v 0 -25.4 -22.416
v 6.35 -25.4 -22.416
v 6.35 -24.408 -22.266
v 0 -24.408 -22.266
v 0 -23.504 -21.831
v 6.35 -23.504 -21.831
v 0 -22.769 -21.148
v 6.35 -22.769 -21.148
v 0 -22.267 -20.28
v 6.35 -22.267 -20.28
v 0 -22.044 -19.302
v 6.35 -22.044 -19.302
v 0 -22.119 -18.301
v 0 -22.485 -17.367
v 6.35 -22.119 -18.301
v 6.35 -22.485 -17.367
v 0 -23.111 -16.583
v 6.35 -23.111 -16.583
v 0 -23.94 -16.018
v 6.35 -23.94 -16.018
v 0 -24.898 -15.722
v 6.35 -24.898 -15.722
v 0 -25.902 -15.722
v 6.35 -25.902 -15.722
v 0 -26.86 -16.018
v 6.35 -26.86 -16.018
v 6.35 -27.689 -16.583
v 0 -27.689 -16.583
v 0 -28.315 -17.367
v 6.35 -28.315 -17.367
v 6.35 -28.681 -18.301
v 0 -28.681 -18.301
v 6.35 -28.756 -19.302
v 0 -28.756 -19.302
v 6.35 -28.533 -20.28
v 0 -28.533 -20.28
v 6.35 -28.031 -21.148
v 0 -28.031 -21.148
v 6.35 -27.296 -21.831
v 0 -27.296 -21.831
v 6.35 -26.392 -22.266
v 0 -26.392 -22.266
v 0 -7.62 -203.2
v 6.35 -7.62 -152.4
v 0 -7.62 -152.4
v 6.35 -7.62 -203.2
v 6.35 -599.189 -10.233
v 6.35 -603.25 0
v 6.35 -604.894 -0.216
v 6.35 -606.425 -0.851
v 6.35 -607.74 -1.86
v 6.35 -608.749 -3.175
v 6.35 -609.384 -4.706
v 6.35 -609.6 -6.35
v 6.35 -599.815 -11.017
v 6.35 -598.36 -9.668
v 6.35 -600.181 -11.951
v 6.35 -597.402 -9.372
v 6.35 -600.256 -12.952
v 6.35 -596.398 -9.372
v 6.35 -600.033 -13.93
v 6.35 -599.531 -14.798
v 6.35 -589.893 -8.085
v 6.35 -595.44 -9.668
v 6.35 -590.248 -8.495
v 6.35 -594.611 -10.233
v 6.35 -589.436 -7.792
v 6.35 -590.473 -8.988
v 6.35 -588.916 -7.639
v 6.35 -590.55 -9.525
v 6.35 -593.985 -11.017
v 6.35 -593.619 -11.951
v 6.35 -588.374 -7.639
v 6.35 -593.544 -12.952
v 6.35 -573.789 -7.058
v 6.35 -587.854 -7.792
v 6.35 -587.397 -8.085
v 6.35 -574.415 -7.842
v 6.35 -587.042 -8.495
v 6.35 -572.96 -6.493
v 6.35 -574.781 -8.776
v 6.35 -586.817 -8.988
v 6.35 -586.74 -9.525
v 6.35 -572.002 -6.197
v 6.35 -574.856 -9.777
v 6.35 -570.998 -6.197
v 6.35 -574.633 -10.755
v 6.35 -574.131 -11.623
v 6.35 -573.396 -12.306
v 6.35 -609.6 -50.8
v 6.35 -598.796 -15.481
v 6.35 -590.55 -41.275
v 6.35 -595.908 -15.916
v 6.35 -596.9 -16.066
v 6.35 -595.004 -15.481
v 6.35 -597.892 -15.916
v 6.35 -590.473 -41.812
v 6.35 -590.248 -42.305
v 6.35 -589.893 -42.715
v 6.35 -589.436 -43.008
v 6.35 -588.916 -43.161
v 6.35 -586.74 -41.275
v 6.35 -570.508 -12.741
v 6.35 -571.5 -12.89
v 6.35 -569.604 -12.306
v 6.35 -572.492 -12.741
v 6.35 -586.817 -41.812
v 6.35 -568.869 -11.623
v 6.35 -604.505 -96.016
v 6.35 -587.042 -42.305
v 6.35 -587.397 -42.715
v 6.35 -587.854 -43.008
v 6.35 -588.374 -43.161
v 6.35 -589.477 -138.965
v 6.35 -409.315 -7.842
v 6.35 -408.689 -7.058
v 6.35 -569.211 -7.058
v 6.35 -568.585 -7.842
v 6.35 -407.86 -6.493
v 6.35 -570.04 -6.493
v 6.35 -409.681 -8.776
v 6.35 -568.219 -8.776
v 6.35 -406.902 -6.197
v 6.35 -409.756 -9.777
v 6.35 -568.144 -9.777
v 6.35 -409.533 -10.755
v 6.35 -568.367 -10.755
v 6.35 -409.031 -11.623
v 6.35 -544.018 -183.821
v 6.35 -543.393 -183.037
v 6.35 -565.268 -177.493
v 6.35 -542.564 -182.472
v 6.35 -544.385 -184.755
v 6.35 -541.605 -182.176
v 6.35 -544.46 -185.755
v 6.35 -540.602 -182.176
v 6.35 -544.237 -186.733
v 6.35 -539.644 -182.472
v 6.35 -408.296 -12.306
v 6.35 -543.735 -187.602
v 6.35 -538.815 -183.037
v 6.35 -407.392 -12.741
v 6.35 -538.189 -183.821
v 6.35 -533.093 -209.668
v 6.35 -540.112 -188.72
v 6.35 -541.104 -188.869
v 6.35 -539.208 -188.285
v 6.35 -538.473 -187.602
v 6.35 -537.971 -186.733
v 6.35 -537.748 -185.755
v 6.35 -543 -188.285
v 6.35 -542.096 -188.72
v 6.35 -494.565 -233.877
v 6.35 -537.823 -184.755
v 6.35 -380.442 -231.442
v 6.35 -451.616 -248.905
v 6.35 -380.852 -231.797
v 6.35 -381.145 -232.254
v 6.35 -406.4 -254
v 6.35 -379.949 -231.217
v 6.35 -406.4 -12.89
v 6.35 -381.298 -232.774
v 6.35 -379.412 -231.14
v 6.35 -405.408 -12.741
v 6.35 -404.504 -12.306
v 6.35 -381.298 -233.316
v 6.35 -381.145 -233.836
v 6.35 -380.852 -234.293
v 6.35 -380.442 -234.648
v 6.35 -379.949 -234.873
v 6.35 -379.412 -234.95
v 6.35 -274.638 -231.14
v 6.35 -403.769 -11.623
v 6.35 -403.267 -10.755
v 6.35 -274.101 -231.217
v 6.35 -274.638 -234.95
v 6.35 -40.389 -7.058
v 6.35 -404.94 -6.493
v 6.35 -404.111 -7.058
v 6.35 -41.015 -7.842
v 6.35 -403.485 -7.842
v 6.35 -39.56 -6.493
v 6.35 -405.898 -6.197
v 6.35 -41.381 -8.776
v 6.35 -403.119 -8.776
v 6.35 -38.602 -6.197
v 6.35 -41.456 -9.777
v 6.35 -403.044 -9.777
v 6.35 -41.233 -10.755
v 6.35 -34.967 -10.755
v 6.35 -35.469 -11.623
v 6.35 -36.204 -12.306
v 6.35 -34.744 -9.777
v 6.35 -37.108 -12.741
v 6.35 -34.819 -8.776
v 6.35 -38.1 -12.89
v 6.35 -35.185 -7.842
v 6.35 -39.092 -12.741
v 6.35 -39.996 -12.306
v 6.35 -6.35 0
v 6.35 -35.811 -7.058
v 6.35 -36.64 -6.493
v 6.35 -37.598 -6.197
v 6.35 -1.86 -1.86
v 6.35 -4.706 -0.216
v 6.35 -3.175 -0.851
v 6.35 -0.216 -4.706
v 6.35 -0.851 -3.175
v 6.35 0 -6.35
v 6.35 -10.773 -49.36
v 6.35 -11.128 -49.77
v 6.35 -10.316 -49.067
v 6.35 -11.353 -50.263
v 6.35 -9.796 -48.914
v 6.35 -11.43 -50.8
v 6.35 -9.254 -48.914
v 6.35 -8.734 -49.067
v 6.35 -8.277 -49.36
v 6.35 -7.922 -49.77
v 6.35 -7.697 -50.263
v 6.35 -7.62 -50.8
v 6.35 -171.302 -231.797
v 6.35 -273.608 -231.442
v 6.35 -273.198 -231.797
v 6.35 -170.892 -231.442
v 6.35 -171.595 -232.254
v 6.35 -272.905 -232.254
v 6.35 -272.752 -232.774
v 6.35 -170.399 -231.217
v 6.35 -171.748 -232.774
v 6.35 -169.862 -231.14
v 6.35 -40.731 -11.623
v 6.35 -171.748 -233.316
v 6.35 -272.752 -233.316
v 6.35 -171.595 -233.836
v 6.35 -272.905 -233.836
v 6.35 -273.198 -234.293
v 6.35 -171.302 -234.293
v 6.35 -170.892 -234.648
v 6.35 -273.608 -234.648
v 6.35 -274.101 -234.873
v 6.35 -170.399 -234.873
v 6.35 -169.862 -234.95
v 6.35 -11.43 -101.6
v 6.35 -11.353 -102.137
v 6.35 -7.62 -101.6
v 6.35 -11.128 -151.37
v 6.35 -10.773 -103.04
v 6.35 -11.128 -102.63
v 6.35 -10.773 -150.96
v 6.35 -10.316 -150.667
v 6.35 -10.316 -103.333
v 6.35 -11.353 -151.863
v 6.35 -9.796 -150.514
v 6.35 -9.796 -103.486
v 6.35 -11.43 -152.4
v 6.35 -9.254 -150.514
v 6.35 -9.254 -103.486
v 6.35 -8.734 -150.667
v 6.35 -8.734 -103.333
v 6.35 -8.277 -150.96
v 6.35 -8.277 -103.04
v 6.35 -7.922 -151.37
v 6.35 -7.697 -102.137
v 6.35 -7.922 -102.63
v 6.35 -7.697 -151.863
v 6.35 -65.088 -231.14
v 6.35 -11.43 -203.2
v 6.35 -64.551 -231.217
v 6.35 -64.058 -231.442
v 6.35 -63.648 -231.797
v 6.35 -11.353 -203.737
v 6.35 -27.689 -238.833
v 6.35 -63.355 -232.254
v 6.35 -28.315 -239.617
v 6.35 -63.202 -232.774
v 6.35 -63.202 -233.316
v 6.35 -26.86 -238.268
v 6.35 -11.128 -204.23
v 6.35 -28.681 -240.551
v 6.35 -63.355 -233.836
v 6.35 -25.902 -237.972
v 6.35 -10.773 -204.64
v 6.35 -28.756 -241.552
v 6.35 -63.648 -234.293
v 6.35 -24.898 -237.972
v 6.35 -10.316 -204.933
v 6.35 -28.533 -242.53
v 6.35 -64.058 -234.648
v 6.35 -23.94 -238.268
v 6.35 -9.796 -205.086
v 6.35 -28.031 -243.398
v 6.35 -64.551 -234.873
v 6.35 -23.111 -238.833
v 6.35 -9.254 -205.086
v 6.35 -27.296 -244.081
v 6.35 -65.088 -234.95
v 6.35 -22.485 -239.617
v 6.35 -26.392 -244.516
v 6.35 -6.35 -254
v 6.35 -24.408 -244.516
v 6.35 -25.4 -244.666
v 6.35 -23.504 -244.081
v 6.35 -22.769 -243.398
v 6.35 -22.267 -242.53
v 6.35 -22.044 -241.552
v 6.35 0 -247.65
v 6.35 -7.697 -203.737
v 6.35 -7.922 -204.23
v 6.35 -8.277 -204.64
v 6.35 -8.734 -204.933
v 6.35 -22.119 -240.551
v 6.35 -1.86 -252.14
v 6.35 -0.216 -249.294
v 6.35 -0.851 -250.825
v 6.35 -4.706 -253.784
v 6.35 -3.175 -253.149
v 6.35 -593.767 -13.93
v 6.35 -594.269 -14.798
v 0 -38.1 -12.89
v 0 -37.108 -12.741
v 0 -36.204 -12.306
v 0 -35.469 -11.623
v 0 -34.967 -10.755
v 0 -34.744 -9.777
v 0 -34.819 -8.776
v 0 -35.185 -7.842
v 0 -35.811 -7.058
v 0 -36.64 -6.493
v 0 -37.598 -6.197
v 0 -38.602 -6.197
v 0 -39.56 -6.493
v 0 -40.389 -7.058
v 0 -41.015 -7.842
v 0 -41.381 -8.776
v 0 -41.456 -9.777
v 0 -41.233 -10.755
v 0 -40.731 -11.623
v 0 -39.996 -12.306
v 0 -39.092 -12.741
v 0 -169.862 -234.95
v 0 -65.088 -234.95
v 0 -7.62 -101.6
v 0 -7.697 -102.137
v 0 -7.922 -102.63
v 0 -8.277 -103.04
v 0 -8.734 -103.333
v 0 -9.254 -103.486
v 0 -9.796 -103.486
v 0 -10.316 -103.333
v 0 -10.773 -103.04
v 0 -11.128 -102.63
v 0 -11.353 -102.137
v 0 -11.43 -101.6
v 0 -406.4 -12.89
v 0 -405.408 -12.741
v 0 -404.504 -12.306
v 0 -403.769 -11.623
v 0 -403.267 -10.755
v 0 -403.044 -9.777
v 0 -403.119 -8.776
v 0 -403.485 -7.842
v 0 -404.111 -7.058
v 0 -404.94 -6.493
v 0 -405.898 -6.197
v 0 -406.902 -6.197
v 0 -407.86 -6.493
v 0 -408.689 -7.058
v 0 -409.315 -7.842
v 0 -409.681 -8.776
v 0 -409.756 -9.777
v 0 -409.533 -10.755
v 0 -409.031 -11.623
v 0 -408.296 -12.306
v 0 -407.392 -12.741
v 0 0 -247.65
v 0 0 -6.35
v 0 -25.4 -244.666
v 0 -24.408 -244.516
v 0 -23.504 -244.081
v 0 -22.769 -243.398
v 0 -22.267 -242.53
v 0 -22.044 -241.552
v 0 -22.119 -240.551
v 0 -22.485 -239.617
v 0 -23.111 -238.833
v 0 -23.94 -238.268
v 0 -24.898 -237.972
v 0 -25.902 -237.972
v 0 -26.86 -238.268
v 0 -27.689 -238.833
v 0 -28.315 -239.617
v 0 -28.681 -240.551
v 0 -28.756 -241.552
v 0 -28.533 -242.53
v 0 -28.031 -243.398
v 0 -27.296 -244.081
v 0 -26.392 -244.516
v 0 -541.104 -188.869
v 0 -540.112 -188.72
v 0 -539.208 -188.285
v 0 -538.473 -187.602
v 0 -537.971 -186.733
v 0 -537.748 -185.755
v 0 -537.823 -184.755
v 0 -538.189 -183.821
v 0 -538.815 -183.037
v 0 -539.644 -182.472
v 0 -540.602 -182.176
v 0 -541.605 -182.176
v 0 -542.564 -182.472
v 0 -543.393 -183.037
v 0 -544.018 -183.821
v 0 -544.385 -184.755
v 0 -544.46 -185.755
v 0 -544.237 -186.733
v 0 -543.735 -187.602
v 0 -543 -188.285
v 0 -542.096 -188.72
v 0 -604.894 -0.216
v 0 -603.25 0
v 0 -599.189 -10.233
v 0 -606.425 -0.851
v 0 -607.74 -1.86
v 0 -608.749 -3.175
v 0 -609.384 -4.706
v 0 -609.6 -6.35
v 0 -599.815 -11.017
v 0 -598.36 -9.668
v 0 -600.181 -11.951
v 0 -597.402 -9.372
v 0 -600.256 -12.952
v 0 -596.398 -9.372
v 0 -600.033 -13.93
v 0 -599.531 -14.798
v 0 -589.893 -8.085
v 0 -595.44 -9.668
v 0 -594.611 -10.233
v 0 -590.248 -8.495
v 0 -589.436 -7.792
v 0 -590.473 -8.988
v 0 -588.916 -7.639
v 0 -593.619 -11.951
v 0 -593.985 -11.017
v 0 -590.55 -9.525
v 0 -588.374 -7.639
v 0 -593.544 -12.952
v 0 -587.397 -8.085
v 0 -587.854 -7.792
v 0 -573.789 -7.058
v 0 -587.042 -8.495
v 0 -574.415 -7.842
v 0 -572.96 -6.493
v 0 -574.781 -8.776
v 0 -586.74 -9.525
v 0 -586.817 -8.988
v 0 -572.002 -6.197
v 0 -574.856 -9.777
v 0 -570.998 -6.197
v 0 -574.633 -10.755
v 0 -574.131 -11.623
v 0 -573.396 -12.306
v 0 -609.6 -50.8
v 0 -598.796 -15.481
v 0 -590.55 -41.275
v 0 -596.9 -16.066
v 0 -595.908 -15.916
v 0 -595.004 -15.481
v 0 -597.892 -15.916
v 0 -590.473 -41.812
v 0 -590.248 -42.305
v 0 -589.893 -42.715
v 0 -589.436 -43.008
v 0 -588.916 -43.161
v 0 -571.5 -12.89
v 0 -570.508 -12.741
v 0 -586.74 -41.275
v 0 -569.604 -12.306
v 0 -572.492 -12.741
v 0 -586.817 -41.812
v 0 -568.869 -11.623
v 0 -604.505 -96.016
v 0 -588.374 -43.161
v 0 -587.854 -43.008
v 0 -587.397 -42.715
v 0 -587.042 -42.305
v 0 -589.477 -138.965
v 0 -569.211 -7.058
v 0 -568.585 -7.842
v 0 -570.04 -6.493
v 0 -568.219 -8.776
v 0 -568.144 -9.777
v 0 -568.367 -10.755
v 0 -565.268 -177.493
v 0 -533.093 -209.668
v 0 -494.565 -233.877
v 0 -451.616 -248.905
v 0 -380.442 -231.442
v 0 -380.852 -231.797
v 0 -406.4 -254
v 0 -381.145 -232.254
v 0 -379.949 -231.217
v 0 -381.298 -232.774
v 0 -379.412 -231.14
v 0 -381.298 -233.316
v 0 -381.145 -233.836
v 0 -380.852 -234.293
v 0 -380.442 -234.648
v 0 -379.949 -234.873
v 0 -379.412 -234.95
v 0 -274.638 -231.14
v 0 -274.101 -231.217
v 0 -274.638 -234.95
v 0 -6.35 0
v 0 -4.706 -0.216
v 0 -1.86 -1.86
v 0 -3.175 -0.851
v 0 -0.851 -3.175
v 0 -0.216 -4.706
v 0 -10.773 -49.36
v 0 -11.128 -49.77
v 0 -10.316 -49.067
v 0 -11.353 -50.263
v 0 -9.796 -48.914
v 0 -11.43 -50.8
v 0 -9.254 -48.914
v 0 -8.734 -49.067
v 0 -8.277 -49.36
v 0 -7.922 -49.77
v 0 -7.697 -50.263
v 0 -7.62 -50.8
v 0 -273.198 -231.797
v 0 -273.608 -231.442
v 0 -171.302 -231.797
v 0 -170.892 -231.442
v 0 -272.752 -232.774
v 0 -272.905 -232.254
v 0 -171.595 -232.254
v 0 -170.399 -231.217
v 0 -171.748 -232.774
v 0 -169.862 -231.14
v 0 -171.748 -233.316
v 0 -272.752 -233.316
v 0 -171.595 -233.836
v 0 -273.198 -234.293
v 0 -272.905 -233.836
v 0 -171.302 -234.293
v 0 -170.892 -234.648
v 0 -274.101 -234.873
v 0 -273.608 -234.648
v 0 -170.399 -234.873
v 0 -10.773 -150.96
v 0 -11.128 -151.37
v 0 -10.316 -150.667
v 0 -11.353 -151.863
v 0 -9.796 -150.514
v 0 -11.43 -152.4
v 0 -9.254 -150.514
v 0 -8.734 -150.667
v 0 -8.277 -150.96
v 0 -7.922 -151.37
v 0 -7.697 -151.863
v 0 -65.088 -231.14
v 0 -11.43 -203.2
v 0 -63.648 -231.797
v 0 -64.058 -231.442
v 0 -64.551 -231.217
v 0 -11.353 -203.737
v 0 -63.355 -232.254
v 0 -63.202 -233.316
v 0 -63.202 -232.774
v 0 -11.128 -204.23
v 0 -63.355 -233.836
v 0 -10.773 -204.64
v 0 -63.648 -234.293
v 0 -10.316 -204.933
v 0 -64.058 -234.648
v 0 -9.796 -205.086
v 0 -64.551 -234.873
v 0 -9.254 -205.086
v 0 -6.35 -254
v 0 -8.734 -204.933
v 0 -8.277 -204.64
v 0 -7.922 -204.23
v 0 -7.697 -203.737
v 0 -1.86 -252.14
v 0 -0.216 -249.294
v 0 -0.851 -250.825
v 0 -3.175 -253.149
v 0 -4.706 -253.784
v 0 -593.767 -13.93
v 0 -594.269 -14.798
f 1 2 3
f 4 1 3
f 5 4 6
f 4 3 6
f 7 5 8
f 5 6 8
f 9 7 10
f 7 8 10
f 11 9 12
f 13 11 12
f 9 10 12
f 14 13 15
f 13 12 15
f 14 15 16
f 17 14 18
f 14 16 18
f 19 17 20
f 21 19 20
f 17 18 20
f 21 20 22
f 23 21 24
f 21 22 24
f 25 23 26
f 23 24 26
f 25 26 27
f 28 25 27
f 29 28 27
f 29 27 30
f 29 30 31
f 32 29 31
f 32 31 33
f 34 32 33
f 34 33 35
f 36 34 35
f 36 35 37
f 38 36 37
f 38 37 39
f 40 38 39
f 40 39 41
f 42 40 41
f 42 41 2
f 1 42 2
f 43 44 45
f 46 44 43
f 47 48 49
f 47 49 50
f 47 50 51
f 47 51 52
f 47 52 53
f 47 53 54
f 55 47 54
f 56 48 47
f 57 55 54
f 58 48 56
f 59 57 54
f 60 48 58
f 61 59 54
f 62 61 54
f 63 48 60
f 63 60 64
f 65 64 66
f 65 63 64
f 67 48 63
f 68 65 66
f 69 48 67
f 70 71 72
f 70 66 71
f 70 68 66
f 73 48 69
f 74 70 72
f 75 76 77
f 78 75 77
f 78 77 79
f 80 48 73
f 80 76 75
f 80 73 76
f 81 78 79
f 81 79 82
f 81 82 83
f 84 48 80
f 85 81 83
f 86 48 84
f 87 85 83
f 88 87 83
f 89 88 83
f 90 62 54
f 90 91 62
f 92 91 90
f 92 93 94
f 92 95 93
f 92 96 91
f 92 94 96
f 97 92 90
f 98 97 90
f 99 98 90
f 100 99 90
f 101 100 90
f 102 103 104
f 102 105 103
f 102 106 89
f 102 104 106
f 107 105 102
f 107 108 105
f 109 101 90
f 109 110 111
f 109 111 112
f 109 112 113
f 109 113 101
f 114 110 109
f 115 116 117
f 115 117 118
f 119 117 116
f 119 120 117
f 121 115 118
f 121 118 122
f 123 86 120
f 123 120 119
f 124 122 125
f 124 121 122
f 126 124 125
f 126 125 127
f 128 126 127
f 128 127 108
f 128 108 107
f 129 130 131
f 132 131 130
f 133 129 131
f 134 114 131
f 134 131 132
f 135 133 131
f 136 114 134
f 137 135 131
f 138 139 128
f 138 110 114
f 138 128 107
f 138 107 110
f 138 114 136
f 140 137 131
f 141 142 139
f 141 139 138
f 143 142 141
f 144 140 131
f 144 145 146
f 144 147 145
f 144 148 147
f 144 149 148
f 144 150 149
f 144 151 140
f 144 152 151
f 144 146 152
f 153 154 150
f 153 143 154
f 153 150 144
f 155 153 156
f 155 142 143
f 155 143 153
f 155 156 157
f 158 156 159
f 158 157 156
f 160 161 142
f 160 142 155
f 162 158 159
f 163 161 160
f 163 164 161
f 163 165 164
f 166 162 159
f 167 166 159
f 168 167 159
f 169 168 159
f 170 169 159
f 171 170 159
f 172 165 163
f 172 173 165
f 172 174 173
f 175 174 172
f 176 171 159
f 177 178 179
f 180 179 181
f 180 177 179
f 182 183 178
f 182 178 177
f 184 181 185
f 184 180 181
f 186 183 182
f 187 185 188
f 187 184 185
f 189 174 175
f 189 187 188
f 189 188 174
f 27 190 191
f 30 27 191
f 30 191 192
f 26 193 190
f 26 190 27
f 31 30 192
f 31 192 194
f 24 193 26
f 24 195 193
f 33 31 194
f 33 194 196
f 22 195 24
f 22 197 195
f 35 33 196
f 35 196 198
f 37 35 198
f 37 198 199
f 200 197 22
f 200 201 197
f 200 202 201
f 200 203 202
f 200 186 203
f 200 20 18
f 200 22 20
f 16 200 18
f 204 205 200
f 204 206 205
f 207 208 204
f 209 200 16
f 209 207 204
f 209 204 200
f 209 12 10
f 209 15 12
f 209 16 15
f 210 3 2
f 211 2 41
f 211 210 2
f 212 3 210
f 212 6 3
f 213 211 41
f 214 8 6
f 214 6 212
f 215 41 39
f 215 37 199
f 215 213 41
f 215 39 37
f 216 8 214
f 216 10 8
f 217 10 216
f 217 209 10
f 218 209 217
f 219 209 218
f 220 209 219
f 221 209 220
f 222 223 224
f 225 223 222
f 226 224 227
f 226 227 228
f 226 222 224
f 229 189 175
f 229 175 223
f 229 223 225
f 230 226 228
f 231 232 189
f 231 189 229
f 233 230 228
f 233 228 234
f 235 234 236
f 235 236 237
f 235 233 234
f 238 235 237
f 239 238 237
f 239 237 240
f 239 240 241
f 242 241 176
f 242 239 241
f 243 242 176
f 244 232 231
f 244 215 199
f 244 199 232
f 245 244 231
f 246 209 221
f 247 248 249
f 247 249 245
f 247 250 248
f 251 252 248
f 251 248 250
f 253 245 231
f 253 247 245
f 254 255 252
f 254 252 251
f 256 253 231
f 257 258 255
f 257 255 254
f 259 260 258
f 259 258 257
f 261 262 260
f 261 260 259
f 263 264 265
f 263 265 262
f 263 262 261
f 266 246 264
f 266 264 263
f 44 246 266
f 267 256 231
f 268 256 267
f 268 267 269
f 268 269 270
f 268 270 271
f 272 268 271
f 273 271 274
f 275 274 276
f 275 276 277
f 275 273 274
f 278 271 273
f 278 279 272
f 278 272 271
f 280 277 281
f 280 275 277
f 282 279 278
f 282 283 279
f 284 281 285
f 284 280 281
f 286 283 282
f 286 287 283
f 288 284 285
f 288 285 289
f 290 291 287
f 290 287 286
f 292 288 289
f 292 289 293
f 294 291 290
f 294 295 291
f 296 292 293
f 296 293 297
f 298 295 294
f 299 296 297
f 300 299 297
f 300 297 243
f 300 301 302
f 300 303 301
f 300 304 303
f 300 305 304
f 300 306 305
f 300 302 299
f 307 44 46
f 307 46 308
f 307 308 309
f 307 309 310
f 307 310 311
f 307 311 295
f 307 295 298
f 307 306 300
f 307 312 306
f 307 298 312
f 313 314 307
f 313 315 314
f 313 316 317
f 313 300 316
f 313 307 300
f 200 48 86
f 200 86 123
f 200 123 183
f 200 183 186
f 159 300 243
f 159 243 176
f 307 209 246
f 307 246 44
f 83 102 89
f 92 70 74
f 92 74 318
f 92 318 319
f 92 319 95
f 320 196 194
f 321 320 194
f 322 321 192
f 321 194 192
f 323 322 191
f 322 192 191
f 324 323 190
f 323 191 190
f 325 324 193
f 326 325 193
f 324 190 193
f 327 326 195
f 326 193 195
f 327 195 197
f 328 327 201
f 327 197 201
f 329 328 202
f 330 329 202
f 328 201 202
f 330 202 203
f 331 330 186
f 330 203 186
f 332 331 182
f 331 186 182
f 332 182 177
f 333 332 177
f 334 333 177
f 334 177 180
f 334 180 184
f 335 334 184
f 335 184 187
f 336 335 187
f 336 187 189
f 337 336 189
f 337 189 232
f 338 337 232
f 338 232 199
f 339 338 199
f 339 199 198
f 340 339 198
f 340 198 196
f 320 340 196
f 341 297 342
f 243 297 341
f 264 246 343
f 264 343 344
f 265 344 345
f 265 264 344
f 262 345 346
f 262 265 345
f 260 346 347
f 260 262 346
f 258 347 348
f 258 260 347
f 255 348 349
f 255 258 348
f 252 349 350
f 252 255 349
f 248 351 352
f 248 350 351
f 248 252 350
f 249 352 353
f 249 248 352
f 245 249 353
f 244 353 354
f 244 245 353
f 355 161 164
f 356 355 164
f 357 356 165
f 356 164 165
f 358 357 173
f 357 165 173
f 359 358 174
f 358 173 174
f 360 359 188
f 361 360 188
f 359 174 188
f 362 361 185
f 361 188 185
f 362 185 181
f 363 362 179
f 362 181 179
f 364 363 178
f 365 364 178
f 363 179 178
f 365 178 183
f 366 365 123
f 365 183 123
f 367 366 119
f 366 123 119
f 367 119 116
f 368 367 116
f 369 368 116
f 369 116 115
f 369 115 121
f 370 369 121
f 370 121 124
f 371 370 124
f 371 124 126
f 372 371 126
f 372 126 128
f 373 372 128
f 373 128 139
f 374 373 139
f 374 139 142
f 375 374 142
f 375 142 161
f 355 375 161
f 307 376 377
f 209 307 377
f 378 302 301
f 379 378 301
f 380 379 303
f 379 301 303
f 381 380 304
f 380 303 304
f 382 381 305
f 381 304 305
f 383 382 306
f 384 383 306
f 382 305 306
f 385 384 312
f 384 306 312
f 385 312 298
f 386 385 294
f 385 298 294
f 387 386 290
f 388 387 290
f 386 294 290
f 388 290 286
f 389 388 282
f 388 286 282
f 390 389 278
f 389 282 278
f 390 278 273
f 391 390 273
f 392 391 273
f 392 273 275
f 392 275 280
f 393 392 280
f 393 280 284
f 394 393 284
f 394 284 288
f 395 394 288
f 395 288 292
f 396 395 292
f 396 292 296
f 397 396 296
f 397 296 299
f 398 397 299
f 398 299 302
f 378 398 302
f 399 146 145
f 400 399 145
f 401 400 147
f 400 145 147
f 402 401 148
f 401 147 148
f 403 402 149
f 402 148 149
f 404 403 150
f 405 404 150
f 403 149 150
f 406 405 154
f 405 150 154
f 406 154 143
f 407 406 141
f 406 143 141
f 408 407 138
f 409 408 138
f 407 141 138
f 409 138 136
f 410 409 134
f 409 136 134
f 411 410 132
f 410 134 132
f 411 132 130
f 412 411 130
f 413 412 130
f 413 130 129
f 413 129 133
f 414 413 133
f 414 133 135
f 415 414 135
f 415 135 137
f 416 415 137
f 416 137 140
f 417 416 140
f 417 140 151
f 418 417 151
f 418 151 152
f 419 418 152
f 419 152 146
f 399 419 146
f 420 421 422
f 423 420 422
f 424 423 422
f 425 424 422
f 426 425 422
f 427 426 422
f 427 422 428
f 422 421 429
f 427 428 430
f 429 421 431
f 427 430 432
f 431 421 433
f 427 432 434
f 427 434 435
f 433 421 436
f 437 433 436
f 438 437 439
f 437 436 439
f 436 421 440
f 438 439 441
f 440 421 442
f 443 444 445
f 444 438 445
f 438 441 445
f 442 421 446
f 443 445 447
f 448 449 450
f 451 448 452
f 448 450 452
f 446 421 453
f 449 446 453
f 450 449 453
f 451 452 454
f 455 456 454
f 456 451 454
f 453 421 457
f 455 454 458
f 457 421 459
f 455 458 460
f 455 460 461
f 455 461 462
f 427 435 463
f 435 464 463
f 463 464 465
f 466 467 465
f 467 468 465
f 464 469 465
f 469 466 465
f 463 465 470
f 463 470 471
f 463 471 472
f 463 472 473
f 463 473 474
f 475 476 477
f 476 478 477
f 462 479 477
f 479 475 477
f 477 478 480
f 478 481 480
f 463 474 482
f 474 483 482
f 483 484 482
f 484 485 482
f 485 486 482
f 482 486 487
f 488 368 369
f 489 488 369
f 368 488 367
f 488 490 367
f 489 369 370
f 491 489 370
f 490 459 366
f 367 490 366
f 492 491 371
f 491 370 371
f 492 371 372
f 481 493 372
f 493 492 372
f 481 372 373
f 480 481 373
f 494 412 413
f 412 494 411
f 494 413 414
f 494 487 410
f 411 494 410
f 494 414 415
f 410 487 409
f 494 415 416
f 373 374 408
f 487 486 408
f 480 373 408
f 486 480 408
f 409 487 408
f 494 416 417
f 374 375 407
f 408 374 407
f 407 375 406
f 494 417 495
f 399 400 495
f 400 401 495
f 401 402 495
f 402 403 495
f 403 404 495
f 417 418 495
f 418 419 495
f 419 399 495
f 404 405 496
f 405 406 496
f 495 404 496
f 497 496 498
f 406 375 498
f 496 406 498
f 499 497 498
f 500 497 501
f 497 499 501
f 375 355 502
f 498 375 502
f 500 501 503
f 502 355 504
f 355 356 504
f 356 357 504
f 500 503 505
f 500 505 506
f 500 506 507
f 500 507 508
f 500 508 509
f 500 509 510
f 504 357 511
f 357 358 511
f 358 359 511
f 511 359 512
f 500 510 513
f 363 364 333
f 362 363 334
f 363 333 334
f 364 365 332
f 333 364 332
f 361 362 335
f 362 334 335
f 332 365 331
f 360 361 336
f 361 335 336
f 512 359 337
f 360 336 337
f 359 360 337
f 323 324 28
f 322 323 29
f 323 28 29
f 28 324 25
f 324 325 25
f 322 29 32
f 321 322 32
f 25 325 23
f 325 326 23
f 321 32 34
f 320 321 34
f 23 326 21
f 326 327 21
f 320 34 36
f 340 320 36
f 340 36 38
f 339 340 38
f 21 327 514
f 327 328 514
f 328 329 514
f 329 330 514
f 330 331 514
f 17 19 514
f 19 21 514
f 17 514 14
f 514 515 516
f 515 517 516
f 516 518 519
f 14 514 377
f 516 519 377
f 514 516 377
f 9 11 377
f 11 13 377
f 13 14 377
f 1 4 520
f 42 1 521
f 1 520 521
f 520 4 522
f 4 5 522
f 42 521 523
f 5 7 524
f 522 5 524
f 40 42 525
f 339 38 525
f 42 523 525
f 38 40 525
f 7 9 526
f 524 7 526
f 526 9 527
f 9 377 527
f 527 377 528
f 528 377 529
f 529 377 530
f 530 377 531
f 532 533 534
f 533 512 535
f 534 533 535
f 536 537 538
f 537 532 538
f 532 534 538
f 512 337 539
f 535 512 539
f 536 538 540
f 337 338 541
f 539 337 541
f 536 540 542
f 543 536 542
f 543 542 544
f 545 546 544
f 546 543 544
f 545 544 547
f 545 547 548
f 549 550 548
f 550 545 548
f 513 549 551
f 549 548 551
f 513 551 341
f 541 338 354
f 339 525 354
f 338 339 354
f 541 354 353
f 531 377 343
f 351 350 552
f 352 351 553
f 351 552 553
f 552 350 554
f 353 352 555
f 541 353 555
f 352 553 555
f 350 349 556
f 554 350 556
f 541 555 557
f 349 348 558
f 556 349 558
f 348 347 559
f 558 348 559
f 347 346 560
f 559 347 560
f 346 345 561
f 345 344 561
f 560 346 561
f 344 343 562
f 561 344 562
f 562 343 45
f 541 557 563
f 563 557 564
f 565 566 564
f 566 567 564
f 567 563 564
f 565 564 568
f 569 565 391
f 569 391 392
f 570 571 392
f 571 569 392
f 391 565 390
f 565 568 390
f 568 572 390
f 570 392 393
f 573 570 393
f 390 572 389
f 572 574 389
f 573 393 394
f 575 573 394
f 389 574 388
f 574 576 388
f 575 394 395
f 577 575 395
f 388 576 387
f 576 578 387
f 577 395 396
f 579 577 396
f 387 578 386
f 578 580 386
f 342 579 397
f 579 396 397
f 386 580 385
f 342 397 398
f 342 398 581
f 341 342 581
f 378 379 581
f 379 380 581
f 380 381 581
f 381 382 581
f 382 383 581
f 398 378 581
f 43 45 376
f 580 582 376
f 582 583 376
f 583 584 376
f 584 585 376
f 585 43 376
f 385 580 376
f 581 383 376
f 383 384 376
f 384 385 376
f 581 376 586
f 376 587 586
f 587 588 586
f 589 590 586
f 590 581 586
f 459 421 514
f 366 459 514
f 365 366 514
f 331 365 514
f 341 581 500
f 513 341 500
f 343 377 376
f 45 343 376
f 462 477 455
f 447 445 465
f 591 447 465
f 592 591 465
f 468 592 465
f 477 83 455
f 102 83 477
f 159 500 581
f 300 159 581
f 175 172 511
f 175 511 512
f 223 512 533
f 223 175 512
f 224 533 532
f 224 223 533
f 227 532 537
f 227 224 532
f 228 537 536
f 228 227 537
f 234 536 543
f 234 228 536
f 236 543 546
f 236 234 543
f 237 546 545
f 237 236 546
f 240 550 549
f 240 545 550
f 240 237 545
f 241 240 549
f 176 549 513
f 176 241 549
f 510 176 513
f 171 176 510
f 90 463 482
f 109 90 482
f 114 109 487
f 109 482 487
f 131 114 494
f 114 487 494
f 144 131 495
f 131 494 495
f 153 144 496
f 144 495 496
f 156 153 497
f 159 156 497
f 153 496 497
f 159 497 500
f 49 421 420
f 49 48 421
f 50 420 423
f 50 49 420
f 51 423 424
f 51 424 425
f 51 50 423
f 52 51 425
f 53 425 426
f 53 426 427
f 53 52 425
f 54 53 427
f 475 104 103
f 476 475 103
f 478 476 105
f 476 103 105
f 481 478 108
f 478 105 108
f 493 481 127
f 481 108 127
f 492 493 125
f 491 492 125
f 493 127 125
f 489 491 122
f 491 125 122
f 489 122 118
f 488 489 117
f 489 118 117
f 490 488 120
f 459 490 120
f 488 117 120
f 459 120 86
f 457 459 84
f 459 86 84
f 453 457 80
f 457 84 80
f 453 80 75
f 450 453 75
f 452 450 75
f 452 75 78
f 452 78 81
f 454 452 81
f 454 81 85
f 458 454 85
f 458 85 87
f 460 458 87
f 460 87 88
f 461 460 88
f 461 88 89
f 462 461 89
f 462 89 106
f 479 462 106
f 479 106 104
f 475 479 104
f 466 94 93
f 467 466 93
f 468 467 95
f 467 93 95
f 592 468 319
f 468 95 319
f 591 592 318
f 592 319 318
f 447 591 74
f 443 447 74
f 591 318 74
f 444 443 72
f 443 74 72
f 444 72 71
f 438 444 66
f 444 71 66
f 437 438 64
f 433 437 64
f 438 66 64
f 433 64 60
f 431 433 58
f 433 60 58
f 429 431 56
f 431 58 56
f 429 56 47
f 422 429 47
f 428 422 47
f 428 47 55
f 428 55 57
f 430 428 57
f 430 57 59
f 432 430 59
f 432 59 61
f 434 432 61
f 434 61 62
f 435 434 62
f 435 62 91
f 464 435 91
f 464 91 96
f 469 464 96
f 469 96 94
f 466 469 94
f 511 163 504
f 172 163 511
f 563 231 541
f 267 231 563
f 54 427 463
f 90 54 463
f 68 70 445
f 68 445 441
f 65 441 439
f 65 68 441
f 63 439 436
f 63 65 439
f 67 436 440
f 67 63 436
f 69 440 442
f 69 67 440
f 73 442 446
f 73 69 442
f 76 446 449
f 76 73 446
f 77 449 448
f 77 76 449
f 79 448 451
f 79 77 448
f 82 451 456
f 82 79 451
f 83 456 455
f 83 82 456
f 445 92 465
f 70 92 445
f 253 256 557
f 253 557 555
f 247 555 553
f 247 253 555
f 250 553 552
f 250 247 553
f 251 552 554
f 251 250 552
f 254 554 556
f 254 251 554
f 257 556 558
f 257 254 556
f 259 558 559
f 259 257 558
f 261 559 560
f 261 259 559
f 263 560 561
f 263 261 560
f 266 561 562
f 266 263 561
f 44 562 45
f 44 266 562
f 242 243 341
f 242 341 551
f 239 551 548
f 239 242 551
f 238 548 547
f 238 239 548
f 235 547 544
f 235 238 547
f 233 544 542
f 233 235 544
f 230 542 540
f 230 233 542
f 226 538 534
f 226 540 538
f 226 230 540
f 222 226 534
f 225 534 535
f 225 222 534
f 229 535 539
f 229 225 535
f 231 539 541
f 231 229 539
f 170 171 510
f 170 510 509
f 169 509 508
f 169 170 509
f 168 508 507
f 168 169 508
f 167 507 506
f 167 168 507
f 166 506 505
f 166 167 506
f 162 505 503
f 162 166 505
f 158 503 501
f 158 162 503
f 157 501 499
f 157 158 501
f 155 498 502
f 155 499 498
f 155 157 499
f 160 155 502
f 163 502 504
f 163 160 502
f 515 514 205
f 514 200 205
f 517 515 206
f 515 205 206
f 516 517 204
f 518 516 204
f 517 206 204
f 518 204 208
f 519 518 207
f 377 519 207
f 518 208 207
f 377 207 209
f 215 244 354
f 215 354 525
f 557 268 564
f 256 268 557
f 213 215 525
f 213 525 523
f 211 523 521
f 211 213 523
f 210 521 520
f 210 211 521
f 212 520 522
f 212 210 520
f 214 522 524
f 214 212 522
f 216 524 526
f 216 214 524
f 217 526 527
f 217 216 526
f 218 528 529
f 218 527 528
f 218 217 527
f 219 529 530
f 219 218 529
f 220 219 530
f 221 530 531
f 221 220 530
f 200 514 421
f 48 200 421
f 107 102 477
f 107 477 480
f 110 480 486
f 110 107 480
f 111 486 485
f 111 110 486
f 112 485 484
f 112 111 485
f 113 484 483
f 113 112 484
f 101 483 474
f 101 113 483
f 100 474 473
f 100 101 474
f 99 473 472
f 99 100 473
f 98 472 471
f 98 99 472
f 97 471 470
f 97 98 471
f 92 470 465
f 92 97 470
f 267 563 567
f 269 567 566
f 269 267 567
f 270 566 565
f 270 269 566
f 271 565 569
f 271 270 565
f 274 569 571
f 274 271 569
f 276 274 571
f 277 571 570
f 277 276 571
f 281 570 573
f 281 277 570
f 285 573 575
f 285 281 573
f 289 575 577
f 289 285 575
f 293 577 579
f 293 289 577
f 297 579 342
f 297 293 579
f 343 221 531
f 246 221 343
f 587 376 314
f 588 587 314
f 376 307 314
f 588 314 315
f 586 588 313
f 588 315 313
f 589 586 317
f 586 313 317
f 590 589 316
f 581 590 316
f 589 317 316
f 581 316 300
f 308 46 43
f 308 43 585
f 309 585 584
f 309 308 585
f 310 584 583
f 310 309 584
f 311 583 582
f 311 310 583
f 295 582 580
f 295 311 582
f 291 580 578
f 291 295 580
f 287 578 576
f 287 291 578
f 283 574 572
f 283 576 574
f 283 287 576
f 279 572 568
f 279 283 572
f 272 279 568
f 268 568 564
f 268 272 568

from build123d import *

# Parameters (mm, degrees)
BOSS_EXTRUDE1_DEPTH     = 6.35
SKETCH2_R               = 3.3655
CUT_EXTRUDE1_DEPTH      = 7.35
FILLET1_R               = 6.35
CUT_EXTRUDE6_DEPTH      = 7.35
SKETCH4_R               = 3.3655
CUT_EXTRUDE3_DEPTH      = 7.35
CUT_EXTRUDE7_DEPTH      = 7.35
CUT_EXTRUDE8_DEPTH      = 1
CUT_EXTRUDE8_DEPTH_BACK = 7.35


with BuildPart() as part:
    # Sketch1 → Boss-Extrude1 (new body)
    with BuildSketch(Plane(origin=(0, 0, 0), x_dir=(0, 0, -1), z_dir=(1, 0, 0))):
        with BuildLine():
            Line((0, 0), (0, -609.6))
            Line((0, -609.6), (50.8, -609.6))
            ThreePointArc((50.8, -609.6), (194.484097937, -550.084097937), (254, -406.4))
            Line((254, -406.4), (254, 0))
            Line((254, 0), (0, 0))
        make_face()
    extrude(amount=BOSS_EXTRUDE1_DEPTH)

    # Sketch2 → Cut-Extrude1 (cut, through all)
    with BuildSketch(Plane(origin=(6.35, 0, 0), x_dir=(0, 0, -1), z_dir=(1, 0, 0))):
        with Locations((241.3, -25.4)):
            Circle(SKETCH2_R)
        with Locations((12.7, -596.9)):
            Circle(SKETCH2_R)
        with Locations((185.503841816, -541.103841816)):
            Circle(SKETCH2_R)
        with Locations((19.05, -25.4)):
            Circle(SKETCH2_R)
    extrude(amount=-CUT_EXTRUDE1_DEPTH, mode=Mode.SUBTRACT)

    # Fillet1
    fillet1_edges = [part.edges().sort_by_distance(p)[0] for p in [
        (3.175, 0, -254),
        (3.175, -609.6, 0),
        (3.175, 0, 0),
    ]]
    fillet(fillet1_edges, radius=FILLET1_R)

    # Sketch3 → Cut-Extrude6 (cut, through all)
    with BuildSketch(Plane(origin=(6.35, 0, 0), x_dir=(0, 0, -1), z_dir=(1, 0, 0))):
        with BuildLine():
            Line((50.8, -7.62), (101.6, -7.62))
            ThreePointArc((101.6, -7.62), (103.505, -9.525), (101.6, -11.43))
            Line((101.6, -11.43), (50.8, -11.43))
            ThreePointArc((50.8, -11.43), (48.895, -9.525), (50.8, -7.62))
        make_face()
        with BuildLine():
            Line((152.4, -7.62), (203.2, -7.62))
            ThreePointArc((203.2, -7.62), (205.105, -9.525), (203.2, -11.43))
            Line((203.2, -11.43), (152.4, -11.43))
            ThreePointArc((152.4, -11.43), (150.495, -9.525), (152.4, -7.62))
        make_face()
    extrude(amount=-CUT_EXTRUDE6_DEPTH, mode=Mode.SUBTRACT)

    # Sketch4 → Cut-Extrude3 (cut, through all)
    with BuildSketch(Plane(origin=(6.35, 0, 0), x_dir=(0, 0, -1), z_dir=(1, 0, 0))):
        with Locations((9.525, -38.1)):
            Circle(SKETCH4_R)
        with Locations((9.525, -406.4)):
            Circle(SKETCH4_R)
        with Locations((9.525, -571.5)):
            Circle(SKETCH4_R)
    extrude(amount=-CUT_EXTRUDE3_DEPTH, mode=Mode.SUBTRACT)

    # Sketch6 → Cut-Extrude7 (cut, through all)
    with BuildSketch(Plane(origin=(6.35, 0, 0), x_dir=(0, 0, -1), z_dir=(1, 0, 0))):
        with BuildLine():
            Line((234.95, -65.0875), (234.95, -169.8625))
            ThreePointArc((234.95, -169.8625), (233.045, -171.7675), (231.14, -169.8625))
            Line((231.14, -169.8625), (231.14, -65.0875))
            ThreePointArc((231.14, -65.0875), (233.045, -63.1825), (234.95, -65.0875))
        make_face()
        with BuildLine():
            Line((231.14, -379.4125), (231.14, -274.6375))
            ThreePointArc((231.14, -274.6375), (233.045, -272.7325), (234.95, -274.6375))
            Line((234.95, -274.6375), (234.95, -379.4125))
            ThreePointArc((234.95, -379.4125), (233.045, -381.3175), (231.14, -379.4125))
        make_face()
    extrude(amount=-CUT_EXTRUDE7_DEPTH, mode=Mode.SUBTRACT)

    # Sketch7 → Cut-Extrude8 (cut, two sides)
    with BuildSketch(Plane(origin=(6.35, 0, 0), x_dir=(0, 0, -1), z_dir=(1, 0, 0))) as cut_extrude8_sk:
        with BuildLine():
            Line((9.525, -586.74), (41.275, -586.74))
            ThreePointArc((41.275, -586.74), (43.18, -588.645), (41.275, -590.55))
            Line((41.275, -590.55), (9.525, -590.55))
            ThreePointArc((9.525, -590.55), (7.62, -588.645), (9.525, -586.74))
        make_face()
    extrude(amount=CUT_EXTRUDE8_DEPTH, mode=Mode.SUBTRACT)
    extrude(cut_extrude8_sk.sketch, amount=-CUT_EXTRUDE8_DEPTH_BACK, mode=Mode.SUBTRACT)


solid = part.part
